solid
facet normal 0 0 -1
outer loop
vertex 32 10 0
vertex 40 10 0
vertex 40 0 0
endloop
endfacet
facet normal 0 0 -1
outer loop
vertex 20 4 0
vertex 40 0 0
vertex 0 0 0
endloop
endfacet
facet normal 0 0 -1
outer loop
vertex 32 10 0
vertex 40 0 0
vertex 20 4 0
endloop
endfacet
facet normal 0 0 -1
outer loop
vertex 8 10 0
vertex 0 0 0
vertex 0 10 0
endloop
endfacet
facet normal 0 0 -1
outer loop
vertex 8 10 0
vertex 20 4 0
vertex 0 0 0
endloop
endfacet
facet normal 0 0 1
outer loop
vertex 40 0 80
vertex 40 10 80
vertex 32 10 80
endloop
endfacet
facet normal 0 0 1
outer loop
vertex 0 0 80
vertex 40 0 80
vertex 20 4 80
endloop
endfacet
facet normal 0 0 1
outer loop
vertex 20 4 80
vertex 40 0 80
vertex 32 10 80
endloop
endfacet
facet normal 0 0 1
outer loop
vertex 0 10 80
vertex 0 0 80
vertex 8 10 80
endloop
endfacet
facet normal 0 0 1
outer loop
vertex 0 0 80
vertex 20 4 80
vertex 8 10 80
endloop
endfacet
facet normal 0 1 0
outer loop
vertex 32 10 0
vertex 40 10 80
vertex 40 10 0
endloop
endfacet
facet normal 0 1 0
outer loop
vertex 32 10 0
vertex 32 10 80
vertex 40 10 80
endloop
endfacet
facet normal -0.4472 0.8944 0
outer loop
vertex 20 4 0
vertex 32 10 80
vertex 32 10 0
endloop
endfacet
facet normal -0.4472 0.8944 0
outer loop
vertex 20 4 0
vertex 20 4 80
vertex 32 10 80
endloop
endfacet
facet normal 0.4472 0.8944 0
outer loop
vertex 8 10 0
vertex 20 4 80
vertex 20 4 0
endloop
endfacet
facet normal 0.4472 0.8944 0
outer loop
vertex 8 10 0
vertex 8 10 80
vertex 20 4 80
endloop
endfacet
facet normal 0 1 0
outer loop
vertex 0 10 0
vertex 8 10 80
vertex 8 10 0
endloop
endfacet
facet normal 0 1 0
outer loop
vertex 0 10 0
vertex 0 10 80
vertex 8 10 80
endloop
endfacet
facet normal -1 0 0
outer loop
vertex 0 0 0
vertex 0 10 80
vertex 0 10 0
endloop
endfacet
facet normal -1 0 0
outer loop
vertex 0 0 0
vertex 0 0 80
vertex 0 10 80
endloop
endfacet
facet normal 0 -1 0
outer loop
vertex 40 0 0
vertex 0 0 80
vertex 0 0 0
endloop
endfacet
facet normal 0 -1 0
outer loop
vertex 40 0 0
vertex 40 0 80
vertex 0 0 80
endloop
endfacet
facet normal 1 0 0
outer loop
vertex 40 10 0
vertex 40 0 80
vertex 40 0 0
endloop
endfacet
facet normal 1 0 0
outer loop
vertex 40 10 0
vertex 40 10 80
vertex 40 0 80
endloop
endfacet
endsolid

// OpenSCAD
$fn = 32;

// ----------------------------------------------------------------------
// V guide rail: vway, 40 mm wide
// ----------------------------------------------------------------------

// --- parameters (mm) ---
rail_w = 40;              // rail width, X
base_t = 10;              // base plate thickness
v_depth = 6;              // V feature depth / height
v_half_w = 12;            // half width of the V at the base face
plate_t = 80;             // rail length, Z (the extrusion height)

profile = [[0, 0], [40, 0], [40, 10], [32, 10], [20, 4], [8, 10], [0, 10]];  // primary outline, 7 points, counter clockwise

// --- the one profile operation ---
linear_extrude(height = plate_t) polygon(points = profile);
